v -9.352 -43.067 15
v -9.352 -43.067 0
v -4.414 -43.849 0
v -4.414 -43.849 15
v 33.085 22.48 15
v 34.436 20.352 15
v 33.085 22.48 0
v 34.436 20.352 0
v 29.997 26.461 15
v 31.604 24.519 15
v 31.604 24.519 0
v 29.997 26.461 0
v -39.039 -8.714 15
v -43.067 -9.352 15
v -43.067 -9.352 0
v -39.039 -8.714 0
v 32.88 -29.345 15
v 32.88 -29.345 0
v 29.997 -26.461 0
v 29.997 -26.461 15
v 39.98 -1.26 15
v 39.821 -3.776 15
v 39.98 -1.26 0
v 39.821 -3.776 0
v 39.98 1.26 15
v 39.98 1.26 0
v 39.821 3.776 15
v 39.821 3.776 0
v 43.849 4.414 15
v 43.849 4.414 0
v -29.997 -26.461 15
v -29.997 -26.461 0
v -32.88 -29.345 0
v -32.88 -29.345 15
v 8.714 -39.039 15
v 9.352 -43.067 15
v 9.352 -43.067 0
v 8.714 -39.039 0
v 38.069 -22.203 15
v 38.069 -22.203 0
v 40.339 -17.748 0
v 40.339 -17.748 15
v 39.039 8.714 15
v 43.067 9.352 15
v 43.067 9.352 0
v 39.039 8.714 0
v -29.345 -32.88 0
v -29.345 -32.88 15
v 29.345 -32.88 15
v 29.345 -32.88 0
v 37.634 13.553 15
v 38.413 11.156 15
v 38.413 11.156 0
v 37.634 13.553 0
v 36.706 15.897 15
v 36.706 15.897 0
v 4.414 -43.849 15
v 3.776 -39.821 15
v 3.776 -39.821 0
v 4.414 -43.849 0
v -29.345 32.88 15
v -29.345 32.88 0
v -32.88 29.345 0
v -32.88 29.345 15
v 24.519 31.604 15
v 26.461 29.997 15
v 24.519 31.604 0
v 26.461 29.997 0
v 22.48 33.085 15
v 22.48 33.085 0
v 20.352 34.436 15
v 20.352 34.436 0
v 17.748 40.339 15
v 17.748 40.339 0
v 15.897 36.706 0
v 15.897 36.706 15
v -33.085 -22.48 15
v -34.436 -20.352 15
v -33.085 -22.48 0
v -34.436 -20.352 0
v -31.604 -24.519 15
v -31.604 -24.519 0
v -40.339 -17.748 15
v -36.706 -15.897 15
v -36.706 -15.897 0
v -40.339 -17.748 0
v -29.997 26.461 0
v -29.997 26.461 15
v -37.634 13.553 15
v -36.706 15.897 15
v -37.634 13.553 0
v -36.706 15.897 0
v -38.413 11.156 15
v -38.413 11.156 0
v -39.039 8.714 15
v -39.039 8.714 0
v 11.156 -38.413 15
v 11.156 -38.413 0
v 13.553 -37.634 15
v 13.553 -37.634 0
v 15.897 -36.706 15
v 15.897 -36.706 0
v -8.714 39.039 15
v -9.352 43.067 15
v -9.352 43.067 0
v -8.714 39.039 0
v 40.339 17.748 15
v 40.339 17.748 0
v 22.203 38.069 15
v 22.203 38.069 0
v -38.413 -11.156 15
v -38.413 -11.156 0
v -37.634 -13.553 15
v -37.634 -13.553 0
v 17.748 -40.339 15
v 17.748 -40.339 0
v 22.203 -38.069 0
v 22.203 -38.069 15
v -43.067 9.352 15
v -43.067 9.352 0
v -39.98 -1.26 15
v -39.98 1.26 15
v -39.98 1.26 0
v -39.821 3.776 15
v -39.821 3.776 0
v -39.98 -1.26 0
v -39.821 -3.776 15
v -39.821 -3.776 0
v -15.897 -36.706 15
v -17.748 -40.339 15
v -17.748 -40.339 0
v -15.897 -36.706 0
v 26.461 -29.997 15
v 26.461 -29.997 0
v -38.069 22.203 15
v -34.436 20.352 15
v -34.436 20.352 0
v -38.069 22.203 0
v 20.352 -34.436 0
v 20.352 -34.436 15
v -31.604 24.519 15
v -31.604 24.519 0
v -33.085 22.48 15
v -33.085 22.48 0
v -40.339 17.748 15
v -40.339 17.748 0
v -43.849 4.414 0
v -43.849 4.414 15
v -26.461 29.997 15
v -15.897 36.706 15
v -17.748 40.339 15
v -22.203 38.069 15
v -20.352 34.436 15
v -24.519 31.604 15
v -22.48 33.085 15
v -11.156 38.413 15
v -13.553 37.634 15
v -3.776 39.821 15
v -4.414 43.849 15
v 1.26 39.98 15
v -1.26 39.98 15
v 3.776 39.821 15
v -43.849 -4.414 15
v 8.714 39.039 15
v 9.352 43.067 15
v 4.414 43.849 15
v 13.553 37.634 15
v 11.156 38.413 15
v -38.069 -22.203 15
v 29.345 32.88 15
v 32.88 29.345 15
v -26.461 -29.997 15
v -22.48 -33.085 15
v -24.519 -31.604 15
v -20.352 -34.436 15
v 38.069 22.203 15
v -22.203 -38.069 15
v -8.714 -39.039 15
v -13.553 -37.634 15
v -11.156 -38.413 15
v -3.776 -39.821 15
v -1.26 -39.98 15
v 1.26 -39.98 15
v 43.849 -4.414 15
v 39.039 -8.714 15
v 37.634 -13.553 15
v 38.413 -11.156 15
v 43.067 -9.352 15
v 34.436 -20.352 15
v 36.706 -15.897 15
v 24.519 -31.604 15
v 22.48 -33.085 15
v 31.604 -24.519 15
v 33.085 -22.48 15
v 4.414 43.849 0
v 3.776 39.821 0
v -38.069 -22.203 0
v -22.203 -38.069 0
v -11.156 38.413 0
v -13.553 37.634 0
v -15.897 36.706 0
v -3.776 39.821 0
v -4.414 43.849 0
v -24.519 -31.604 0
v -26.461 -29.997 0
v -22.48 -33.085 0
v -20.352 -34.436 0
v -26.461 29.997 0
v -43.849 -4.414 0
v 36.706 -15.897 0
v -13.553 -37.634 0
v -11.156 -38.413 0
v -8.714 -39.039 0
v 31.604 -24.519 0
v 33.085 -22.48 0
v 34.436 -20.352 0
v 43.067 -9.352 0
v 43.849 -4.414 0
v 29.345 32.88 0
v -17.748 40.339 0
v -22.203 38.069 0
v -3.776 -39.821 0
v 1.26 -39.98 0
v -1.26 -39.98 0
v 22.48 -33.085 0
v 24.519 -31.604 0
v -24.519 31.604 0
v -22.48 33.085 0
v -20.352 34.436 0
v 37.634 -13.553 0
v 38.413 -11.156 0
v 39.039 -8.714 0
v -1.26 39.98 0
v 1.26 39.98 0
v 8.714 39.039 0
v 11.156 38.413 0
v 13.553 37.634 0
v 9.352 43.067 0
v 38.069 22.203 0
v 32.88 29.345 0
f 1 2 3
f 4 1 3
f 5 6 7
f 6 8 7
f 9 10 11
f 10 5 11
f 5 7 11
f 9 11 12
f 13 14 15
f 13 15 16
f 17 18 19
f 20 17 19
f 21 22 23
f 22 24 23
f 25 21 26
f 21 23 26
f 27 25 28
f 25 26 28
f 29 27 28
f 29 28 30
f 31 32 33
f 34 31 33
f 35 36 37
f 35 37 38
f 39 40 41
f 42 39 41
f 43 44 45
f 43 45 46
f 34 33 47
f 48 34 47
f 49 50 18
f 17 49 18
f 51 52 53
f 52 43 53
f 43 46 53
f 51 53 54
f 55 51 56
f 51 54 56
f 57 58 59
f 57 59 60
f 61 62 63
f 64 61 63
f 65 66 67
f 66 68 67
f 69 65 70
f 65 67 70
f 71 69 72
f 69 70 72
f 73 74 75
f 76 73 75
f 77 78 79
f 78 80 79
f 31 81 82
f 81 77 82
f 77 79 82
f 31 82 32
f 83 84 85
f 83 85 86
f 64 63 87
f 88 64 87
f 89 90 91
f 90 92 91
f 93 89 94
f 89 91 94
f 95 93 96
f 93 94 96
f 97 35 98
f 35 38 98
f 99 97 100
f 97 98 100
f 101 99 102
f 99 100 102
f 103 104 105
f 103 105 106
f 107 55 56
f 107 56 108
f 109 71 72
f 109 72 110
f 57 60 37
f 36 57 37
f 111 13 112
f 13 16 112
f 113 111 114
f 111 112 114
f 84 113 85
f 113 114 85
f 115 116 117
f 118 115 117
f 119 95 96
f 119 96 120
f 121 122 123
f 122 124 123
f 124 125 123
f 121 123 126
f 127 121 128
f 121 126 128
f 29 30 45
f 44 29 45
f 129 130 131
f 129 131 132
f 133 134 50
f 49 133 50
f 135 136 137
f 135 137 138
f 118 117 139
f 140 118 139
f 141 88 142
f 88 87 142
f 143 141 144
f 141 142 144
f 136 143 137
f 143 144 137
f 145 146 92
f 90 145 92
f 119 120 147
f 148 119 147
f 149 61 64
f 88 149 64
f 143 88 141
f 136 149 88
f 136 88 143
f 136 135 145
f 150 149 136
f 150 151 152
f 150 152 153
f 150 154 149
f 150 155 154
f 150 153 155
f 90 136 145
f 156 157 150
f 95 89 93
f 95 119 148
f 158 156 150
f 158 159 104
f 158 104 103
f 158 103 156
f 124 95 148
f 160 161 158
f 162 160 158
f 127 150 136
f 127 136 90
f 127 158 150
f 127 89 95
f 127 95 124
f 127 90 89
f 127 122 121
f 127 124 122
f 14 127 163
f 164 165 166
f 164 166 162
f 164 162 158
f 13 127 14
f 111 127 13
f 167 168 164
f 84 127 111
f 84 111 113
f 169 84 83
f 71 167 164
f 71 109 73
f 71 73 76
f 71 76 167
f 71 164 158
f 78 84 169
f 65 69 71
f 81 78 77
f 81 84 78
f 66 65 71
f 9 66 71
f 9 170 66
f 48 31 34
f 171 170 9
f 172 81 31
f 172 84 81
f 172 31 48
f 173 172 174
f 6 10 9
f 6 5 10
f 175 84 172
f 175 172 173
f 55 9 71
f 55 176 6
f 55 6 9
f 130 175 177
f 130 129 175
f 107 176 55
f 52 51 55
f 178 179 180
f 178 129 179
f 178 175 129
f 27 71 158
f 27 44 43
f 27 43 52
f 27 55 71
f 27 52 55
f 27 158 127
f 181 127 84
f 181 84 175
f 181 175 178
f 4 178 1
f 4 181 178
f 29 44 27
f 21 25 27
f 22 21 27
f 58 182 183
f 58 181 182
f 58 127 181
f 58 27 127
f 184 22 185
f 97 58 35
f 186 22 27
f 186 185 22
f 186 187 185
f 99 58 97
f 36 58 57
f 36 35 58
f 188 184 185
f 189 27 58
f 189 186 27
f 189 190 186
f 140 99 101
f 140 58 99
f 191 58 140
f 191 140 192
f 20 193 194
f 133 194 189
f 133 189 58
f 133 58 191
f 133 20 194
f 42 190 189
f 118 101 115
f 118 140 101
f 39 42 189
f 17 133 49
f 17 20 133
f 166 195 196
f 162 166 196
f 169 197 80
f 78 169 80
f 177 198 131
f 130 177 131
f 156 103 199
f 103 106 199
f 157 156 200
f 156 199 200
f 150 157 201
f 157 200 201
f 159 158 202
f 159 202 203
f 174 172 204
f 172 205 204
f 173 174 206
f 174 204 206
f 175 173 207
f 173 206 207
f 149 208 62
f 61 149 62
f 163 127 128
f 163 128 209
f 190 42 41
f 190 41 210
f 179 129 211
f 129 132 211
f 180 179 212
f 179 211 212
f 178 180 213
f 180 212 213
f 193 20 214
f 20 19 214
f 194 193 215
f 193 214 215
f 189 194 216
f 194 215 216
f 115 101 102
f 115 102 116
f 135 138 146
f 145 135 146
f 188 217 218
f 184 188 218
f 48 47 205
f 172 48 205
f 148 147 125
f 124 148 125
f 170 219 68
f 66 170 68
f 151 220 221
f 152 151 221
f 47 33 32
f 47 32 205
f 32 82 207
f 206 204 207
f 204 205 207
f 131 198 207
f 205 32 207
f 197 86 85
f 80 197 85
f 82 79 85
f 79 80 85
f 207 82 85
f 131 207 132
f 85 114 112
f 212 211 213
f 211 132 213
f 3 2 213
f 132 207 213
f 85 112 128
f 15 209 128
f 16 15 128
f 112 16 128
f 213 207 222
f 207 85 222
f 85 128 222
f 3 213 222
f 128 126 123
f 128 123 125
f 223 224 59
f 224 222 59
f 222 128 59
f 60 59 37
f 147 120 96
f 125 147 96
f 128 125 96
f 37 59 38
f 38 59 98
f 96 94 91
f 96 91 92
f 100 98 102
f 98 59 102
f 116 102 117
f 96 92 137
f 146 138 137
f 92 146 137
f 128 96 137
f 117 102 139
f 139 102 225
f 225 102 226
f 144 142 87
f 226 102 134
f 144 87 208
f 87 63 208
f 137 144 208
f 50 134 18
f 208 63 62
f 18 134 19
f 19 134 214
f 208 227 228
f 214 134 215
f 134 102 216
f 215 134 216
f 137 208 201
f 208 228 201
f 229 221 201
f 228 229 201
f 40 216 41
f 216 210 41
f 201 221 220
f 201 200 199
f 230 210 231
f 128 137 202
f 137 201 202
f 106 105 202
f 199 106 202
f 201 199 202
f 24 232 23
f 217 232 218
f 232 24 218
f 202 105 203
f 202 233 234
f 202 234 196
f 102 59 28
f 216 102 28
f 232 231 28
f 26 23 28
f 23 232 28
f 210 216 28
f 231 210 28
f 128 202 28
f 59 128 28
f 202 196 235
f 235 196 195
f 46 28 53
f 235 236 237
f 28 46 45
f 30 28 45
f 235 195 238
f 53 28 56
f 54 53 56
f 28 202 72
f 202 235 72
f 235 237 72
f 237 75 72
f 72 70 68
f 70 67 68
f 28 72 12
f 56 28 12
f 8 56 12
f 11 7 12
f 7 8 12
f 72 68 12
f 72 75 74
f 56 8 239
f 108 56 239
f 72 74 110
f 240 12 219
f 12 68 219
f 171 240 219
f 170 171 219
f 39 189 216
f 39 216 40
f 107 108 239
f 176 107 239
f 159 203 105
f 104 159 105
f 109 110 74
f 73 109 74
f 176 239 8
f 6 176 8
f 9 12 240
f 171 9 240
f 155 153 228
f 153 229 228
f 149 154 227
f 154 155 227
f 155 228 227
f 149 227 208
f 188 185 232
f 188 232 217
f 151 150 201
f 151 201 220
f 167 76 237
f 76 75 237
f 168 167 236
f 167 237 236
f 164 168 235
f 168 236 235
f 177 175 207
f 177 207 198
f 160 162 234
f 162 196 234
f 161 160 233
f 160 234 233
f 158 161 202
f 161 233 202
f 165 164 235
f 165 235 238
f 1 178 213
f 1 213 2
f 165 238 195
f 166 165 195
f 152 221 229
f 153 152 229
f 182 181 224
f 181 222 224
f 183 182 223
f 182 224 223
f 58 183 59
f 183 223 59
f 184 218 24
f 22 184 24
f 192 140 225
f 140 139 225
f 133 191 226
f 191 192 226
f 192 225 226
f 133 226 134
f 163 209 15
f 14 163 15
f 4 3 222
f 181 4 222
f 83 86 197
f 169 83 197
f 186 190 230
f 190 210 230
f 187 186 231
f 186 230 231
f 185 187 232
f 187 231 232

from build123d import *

# Parameters (mm, degrees)
SKETCH_1_R               = 40
EXTRUDE_1_DEPTH          = 15
EXTRUDE_2_DEPTH          = 15
PATTERN_CIRCULAR_1_COUNT = 20


with BuildPart() as part:
    # 草图1 → 凸台-拉伸1 (new body)
    with BuildSketch(Plane.XY):
        Circle(SKETCH_1_R)
    extrude(amount=EXTRUDE_1_DEPTH)

    # 草图2 → 凸台-拉伸2 (add)
    with BuildSketch(Plane.XY):
        Polygon((39.404775616, 3.709940518), (43.849373149, 4.41389561), (43.067200824, 9.352337313), (38.622603291, 8.648382221), align=None)
    extrude_2 = extrude(amount=EXTRUDE_2_DEPTH)

    # 阵列(圆周)1: 凸台-拉伸2 ×20 about axis
    pattern_circular_1_axis = Axis((0, 0, 15), (0, 0, -1))
    for i in range(1, PATTERN_CIRCULAR_1_COUNT):
        add(extrude_2.rotate(pattern_circular_1_axis, i * 360 / PATTERN_CIRCULAR_1_COUNT))


solid = part.part
